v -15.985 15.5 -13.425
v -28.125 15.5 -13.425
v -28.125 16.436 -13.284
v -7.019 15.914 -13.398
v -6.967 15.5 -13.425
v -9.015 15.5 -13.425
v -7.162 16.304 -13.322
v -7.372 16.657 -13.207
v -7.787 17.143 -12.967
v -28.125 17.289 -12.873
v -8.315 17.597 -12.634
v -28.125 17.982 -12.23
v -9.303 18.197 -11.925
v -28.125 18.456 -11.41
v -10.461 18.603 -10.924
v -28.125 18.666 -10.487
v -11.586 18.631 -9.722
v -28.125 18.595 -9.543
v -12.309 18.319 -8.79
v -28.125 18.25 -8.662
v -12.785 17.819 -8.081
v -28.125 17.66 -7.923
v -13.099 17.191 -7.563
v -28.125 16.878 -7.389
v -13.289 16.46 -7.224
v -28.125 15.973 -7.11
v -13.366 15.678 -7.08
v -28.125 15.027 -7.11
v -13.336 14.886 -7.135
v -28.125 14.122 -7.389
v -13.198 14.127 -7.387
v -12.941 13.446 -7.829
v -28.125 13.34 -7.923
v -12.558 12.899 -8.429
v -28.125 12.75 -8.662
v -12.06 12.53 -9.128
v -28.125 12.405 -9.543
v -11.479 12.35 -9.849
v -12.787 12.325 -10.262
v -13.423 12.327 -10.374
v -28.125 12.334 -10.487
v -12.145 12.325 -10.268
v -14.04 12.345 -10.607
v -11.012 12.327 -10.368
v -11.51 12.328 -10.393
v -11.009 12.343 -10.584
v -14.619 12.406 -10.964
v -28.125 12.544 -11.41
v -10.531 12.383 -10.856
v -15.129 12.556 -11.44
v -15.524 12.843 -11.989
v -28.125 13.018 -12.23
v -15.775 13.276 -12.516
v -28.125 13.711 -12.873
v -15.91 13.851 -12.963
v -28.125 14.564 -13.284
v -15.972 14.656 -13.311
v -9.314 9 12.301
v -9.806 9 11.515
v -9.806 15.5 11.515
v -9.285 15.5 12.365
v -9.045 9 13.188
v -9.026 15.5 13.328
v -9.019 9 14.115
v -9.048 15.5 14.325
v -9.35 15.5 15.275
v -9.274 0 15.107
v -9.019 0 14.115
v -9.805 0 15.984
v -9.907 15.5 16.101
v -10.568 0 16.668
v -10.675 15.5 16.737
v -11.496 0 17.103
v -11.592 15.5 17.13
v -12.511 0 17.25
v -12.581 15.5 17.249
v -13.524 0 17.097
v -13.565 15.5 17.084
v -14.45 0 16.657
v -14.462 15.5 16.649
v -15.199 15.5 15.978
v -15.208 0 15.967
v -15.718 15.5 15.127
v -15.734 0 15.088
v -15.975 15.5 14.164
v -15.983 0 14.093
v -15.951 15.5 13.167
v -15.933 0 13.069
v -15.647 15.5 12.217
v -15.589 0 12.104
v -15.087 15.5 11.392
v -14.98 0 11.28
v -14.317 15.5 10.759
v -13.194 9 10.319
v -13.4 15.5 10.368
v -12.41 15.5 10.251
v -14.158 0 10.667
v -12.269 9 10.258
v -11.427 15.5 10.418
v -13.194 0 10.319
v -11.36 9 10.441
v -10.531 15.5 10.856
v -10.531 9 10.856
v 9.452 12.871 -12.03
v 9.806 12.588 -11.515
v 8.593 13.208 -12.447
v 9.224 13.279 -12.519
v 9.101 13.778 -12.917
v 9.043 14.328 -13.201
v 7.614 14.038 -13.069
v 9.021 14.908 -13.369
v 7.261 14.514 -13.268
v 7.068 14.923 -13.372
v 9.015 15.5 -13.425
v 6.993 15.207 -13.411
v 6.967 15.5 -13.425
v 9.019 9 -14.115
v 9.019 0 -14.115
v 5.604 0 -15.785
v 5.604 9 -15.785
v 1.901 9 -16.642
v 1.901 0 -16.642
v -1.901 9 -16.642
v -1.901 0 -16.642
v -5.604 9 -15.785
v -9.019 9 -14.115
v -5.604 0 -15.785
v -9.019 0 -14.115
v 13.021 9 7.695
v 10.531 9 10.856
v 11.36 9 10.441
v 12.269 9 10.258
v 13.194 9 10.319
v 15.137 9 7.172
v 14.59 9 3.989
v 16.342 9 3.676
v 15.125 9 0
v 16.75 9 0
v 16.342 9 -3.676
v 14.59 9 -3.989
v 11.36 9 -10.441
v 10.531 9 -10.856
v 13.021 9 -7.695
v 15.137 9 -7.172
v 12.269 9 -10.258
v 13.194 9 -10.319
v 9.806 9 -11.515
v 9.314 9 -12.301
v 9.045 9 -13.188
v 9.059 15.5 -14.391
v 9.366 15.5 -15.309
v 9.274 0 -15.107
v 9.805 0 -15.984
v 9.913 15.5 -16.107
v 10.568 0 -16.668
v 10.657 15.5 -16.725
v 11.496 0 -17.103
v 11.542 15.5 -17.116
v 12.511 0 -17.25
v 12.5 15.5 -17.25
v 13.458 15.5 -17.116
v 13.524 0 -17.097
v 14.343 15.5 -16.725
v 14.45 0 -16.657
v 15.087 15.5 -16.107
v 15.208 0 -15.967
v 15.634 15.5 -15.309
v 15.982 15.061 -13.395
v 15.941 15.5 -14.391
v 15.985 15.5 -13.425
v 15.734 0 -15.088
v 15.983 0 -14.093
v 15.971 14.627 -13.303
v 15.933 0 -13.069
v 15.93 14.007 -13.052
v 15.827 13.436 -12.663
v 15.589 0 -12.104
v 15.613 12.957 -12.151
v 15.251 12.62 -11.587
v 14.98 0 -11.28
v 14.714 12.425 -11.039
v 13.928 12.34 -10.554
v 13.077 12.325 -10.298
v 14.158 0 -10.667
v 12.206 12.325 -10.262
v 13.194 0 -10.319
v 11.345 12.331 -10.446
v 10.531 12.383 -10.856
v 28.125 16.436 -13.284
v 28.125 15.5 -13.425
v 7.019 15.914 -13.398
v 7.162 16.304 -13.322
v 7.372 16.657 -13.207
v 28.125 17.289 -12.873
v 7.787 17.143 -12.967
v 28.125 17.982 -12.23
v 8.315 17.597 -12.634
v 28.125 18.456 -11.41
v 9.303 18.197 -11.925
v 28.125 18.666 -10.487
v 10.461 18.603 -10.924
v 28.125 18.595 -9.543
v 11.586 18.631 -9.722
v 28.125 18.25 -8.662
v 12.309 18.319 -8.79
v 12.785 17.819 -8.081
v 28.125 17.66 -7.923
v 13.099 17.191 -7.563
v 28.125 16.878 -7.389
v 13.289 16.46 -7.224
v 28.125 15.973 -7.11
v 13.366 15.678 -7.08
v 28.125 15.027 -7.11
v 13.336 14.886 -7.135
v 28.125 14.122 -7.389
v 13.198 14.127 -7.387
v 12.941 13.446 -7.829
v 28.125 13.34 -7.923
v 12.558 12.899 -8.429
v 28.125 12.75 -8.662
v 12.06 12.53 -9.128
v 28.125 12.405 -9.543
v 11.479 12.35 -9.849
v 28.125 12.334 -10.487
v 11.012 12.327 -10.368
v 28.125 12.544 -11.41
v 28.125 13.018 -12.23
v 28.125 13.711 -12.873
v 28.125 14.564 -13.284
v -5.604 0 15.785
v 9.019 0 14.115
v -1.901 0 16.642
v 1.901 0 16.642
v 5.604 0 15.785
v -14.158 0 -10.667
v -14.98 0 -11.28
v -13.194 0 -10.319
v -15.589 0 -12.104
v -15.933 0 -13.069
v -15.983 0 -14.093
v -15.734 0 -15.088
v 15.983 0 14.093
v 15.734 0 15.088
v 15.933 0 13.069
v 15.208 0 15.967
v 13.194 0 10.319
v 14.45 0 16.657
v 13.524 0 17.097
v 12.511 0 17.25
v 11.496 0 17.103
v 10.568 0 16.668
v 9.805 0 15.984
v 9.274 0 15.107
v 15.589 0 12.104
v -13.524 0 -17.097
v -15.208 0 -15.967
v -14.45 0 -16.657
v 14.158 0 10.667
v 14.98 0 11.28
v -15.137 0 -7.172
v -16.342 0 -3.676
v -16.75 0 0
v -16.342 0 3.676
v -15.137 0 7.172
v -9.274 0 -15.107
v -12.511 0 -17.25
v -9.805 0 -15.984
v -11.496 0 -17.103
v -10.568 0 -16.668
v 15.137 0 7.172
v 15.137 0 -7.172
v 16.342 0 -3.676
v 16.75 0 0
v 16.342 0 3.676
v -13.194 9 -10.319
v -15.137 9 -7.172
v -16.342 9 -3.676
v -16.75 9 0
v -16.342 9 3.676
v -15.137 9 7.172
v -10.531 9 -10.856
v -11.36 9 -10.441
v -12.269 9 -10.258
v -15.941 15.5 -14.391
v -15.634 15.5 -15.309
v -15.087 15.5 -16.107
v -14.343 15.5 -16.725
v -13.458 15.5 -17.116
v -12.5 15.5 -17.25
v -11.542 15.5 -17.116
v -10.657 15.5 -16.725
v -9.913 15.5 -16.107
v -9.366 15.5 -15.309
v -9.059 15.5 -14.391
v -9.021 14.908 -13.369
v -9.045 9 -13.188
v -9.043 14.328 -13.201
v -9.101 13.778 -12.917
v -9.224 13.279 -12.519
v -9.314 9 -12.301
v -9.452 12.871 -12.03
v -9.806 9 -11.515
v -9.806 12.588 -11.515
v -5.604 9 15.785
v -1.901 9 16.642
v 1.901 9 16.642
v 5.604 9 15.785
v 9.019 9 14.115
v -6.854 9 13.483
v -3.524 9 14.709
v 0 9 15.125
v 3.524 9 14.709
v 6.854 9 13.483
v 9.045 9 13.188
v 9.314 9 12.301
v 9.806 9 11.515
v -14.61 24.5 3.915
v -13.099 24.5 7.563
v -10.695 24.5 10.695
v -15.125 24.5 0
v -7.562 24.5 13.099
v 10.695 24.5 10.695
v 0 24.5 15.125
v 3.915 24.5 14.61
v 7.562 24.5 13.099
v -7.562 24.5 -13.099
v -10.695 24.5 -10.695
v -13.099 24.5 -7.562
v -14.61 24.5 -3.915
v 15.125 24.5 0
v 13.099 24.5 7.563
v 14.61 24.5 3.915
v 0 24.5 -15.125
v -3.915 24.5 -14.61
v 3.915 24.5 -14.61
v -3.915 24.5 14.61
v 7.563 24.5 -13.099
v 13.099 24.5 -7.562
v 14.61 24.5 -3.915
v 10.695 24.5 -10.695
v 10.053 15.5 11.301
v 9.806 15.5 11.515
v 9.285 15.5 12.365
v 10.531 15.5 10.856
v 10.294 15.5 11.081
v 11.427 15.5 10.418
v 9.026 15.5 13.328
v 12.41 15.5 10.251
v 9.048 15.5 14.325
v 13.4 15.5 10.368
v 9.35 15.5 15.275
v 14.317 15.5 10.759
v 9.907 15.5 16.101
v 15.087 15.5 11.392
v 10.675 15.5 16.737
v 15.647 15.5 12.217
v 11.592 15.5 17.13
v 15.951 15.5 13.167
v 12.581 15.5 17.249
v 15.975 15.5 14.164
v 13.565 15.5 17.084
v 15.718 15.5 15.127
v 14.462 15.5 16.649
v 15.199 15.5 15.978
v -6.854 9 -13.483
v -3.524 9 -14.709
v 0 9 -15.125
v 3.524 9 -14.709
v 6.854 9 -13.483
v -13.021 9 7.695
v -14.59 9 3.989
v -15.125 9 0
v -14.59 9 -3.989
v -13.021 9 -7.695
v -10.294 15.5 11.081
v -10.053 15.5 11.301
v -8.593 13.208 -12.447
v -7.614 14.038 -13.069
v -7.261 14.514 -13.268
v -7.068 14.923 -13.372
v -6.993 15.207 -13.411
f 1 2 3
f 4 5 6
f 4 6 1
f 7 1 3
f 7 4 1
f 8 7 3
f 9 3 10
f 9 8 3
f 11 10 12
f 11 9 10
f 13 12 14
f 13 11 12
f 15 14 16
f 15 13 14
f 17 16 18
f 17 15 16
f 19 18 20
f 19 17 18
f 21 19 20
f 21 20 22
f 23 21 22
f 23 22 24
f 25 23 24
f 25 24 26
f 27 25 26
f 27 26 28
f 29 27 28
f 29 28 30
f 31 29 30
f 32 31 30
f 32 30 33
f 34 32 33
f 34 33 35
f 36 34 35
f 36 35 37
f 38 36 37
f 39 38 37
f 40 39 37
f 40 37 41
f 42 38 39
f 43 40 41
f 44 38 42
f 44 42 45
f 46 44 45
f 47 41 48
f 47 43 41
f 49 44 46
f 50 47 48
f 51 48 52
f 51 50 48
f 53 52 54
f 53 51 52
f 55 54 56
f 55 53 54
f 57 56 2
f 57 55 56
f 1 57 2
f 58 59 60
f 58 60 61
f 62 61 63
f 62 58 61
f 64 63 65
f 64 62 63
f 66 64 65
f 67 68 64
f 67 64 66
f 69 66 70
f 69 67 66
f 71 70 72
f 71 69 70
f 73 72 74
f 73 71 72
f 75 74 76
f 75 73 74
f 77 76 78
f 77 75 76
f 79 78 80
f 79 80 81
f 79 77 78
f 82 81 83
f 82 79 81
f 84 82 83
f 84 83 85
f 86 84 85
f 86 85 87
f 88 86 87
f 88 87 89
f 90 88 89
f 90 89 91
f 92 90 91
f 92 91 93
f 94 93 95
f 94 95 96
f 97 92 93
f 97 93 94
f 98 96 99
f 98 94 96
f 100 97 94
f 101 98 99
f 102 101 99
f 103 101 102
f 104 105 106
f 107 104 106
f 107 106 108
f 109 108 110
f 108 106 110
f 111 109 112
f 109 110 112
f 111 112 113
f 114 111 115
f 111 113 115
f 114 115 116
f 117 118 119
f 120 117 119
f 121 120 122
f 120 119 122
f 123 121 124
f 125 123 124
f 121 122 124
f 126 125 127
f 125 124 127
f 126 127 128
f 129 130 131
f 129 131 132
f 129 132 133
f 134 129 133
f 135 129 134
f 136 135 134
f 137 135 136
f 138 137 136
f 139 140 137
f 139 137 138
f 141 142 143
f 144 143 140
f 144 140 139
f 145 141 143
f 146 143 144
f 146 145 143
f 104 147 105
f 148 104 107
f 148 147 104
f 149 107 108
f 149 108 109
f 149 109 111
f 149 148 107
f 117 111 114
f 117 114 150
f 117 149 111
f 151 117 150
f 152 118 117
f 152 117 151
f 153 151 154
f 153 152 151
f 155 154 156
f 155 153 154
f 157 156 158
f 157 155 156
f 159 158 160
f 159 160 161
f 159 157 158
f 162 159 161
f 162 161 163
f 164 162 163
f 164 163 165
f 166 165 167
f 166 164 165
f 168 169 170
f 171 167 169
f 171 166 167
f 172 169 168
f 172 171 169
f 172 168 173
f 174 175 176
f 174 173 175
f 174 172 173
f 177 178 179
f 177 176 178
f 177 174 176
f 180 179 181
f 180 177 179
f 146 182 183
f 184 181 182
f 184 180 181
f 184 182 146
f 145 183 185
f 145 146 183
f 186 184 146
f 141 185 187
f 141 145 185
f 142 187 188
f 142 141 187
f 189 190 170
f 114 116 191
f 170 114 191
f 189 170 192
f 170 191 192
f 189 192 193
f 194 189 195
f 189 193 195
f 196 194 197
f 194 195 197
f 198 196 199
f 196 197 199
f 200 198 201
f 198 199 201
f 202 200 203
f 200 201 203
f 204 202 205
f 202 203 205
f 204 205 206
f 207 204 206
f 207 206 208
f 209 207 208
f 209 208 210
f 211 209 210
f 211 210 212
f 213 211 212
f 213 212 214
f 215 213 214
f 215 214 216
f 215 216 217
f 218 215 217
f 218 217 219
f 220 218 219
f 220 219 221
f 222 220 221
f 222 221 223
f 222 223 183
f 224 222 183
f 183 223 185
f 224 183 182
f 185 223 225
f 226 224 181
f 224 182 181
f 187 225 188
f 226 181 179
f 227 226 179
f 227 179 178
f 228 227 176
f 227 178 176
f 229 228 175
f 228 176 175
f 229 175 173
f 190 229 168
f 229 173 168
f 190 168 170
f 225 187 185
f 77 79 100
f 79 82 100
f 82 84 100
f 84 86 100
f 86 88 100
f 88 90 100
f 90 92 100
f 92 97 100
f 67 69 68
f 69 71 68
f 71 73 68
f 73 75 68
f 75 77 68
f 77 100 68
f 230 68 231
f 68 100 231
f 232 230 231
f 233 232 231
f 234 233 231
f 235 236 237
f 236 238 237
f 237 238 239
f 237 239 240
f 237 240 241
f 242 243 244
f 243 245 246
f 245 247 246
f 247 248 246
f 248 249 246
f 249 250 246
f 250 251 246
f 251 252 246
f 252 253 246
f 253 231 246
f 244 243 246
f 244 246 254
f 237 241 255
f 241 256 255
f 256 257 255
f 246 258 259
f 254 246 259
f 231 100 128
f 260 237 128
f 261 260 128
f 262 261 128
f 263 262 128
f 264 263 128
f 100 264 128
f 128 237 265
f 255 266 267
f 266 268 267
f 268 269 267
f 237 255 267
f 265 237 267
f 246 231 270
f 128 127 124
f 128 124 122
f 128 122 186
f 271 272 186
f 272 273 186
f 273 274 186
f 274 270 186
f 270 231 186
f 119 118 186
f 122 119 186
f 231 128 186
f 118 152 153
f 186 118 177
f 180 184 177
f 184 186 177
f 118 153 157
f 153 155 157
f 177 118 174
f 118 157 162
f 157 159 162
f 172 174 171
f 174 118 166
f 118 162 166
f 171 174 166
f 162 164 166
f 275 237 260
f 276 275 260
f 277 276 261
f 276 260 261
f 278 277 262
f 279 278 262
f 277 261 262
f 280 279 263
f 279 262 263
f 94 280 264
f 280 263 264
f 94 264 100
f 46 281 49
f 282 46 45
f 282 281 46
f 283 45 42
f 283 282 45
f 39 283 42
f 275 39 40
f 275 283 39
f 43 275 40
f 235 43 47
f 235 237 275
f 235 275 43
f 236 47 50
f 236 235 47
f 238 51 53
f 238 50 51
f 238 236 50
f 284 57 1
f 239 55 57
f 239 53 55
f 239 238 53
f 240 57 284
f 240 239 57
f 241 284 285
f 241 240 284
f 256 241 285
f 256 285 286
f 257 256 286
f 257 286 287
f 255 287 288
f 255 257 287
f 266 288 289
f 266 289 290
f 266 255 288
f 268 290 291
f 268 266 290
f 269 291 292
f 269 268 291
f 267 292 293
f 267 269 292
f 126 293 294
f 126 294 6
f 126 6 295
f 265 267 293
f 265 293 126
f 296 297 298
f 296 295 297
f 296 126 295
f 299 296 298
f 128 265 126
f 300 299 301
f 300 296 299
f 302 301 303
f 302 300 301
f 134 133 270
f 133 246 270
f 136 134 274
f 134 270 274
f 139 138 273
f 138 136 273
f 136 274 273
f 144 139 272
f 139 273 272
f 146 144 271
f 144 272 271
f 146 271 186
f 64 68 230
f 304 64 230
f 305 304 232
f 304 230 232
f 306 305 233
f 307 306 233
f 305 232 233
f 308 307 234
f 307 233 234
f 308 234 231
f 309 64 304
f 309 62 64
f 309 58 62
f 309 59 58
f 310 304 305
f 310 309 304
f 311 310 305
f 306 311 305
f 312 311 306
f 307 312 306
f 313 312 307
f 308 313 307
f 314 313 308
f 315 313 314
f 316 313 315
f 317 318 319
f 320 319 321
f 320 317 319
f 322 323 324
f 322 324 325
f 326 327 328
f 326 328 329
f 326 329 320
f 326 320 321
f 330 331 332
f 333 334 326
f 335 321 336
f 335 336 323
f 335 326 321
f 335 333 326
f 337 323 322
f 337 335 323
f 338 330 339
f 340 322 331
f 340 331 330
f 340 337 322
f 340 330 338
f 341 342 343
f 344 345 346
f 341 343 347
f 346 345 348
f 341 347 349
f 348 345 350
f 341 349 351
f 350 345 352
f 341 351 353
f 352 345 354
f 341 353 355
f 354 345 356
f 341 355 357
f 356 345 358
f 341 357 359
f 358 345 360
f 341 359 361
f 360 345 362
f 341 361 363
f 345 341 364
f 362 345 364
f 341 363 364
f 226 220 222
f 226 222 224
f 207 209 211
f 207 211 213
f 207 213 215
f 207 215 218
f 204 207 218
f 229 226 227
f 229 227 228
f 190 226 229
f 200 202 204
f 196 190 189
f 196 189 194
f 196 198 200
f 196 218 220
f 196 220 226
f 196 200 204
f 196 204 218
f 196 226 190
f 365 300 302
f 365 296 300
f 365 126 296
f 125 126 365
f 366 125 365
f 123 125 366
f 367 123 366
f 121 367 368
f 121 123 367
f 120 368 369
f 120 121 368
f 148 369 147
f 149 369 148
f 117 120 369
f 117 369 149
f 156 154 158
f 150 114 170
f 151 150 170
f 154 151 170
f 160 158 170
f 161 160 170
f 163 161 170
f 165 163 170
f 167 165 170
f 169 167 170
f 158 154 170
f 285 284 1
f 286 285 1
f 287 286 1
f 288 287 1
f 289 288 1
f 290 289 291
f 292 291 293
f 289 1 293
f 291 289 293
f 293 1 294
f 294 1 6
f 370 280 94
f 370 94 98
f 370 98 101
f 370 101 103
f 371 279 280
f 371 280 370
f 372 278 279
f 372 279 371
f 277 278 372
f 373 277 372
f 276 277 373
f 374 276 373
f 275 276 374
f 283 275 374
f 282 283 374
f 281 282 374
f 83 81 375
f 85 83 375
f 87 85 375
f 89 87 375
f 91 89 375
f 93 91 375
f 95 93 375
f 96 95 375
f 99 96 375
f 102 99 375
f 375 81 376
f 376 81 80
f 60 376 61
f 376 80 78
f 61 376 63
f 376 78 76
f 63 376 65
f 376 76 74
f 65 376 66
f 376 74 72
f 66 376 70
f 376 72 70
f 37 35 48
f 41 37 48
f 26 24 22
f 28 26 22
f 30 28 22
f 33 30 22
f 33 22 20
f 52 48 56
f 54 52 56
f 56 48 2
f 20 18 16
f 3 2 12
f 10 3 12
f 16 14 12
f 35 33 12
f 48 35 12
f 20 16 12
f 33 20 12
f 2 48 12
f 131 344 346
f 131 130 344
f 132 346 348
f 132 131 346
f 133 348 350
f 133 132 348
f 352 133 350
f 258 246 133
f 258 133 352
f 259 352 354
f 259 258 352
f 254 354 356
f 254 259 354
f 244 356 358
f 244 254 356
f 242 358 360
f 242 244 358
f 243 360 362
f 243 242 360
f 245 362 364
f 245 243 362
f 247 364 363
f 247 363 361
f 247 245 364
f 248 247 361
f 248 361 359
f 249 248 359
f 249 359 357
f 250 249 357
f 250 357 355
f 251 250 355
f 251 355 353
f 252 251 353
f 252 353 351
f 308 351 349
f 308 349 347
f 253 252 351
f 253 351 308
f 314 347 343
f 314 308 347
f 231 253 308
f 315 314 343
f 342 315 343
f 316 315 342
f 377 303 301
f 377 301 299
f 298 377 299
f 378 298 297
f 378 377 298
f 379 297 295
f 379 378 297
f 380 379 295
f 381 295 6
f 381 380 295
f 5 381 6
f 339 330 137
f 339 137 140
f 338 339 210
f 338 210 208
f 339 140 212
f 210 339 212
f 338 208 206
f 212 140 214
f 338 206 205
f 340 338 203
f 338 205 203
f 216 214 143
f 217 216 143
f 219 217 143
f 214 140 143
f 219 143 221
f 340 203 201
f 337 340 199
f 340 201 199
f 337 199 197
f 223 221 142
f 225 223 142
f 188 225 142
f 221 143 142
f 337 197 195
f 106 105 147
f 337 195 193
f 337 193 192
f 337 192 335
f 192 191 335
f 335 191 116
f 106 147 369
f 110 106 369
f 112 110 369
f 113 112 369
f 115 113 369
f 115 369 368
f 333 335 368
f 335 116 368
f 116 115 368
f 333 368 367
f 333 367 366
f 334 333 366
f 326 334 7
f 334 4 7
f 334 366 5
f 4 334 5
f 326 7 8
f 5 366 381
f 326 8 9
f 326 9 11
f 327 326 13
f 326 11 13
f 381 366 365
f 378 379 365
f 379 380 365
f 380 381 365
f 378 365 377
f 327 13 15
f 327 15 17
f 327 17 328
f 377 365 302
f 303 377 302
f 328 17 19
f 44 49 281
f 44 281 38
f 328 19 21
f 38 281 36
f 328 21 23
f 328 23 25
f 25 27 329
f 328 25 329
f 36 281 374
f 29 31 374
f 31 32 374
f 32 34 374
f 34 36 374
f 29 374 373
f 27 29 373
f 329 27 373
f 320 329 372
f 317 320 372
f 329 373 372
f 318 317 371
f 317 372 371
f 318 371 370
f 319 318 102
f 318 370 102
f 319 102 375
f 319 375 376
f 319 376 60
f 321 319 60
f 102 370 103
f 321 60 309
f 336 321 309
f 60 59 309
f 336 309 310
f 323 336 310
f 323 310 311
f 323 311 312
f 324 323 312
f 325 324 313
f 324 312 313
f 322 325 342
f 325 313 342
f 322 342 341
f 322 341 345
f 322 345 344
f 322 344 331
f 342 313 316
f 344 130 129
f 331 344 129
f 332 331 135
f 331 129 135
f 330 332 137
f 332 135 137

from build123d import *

# Parameters (mm, degrees)
SKETCH1_R           = 16.75
BOSS_EXTRUDE1_DEPTH = 9
SKETCH2_R           = 15.125
BOSS_EXTRUDE2_DEPTH = 15.5
SKETCH3_R           = 3.5
BOSS_EXTRUDE3_DEPTH = 15.5
BOSS_EXTRUDE4_START = -15.5
SKETCH4_R           = 3.175
BOSS_EXTRUDE4_DEPTH = 28.5


with BuildPart() as part:
    # Sketch1 → Boss-Extrude1 (new body)
    with BuildSketch(Plane(origin=(0, 0, 0), x_dir=(1, 0, 0), z_dir=(0, 1, 0))):
        Circle(SKETCH1_R)
    extrude(amount=BOSS_EXTRUDE1_DEPTH)

    # Sketch2 → Boss-Extrude2 (add)
    with BuildSketch(Plane(origin=(0, 9, 0), x_dir=(1, 0, 0), z_dir=(0, 1, 0))):
        Circle(SKETCH2_R)
    extrude(amount=BOSS_EXTRUDE2_DEPTH)

    # Sketch3 → Boss-Extrude3 (add)
    with BuildSketch(Plane.XZ):
        with Locations((-12.5, 13.75)):
            Circle(SKETCH3_R)
        with Locations((12.5, 13.75)):
            Circle(SKETCH3_R)
        with Locations((12.5, -13.75)):
            Circle(SKETCH3_R)
        with Locations((-12.5, -13.75)):
            Circle(SKETCH3_R)
    extrude(amount=-BOSS_EXTRUDE3_DEPTH)

    # Sketch4 → Boss-Extrude4 (add)
    with BuildSketch(Plane(origin=(15.125, 0, 0), x_dir=(0, 0, -1), z_dir=(1, 0, 0)).offset(BOSS_EXTRUDE4_START)):
        with Locations((10.25, 15.5)):
            Circle(SKETCH4_R)
    boss_extrude4 = extrude(amount=BOSS_EXTRUDE4_DEPTH)

    # Mirror1: Boss-Extrude4 across plane
    add(boss_extrude4.mirror(Plane(origin=(0, 0, 0), x_dir=(0, 0, 1), z_dir=(1, 0, 0))))


solid = part.part
